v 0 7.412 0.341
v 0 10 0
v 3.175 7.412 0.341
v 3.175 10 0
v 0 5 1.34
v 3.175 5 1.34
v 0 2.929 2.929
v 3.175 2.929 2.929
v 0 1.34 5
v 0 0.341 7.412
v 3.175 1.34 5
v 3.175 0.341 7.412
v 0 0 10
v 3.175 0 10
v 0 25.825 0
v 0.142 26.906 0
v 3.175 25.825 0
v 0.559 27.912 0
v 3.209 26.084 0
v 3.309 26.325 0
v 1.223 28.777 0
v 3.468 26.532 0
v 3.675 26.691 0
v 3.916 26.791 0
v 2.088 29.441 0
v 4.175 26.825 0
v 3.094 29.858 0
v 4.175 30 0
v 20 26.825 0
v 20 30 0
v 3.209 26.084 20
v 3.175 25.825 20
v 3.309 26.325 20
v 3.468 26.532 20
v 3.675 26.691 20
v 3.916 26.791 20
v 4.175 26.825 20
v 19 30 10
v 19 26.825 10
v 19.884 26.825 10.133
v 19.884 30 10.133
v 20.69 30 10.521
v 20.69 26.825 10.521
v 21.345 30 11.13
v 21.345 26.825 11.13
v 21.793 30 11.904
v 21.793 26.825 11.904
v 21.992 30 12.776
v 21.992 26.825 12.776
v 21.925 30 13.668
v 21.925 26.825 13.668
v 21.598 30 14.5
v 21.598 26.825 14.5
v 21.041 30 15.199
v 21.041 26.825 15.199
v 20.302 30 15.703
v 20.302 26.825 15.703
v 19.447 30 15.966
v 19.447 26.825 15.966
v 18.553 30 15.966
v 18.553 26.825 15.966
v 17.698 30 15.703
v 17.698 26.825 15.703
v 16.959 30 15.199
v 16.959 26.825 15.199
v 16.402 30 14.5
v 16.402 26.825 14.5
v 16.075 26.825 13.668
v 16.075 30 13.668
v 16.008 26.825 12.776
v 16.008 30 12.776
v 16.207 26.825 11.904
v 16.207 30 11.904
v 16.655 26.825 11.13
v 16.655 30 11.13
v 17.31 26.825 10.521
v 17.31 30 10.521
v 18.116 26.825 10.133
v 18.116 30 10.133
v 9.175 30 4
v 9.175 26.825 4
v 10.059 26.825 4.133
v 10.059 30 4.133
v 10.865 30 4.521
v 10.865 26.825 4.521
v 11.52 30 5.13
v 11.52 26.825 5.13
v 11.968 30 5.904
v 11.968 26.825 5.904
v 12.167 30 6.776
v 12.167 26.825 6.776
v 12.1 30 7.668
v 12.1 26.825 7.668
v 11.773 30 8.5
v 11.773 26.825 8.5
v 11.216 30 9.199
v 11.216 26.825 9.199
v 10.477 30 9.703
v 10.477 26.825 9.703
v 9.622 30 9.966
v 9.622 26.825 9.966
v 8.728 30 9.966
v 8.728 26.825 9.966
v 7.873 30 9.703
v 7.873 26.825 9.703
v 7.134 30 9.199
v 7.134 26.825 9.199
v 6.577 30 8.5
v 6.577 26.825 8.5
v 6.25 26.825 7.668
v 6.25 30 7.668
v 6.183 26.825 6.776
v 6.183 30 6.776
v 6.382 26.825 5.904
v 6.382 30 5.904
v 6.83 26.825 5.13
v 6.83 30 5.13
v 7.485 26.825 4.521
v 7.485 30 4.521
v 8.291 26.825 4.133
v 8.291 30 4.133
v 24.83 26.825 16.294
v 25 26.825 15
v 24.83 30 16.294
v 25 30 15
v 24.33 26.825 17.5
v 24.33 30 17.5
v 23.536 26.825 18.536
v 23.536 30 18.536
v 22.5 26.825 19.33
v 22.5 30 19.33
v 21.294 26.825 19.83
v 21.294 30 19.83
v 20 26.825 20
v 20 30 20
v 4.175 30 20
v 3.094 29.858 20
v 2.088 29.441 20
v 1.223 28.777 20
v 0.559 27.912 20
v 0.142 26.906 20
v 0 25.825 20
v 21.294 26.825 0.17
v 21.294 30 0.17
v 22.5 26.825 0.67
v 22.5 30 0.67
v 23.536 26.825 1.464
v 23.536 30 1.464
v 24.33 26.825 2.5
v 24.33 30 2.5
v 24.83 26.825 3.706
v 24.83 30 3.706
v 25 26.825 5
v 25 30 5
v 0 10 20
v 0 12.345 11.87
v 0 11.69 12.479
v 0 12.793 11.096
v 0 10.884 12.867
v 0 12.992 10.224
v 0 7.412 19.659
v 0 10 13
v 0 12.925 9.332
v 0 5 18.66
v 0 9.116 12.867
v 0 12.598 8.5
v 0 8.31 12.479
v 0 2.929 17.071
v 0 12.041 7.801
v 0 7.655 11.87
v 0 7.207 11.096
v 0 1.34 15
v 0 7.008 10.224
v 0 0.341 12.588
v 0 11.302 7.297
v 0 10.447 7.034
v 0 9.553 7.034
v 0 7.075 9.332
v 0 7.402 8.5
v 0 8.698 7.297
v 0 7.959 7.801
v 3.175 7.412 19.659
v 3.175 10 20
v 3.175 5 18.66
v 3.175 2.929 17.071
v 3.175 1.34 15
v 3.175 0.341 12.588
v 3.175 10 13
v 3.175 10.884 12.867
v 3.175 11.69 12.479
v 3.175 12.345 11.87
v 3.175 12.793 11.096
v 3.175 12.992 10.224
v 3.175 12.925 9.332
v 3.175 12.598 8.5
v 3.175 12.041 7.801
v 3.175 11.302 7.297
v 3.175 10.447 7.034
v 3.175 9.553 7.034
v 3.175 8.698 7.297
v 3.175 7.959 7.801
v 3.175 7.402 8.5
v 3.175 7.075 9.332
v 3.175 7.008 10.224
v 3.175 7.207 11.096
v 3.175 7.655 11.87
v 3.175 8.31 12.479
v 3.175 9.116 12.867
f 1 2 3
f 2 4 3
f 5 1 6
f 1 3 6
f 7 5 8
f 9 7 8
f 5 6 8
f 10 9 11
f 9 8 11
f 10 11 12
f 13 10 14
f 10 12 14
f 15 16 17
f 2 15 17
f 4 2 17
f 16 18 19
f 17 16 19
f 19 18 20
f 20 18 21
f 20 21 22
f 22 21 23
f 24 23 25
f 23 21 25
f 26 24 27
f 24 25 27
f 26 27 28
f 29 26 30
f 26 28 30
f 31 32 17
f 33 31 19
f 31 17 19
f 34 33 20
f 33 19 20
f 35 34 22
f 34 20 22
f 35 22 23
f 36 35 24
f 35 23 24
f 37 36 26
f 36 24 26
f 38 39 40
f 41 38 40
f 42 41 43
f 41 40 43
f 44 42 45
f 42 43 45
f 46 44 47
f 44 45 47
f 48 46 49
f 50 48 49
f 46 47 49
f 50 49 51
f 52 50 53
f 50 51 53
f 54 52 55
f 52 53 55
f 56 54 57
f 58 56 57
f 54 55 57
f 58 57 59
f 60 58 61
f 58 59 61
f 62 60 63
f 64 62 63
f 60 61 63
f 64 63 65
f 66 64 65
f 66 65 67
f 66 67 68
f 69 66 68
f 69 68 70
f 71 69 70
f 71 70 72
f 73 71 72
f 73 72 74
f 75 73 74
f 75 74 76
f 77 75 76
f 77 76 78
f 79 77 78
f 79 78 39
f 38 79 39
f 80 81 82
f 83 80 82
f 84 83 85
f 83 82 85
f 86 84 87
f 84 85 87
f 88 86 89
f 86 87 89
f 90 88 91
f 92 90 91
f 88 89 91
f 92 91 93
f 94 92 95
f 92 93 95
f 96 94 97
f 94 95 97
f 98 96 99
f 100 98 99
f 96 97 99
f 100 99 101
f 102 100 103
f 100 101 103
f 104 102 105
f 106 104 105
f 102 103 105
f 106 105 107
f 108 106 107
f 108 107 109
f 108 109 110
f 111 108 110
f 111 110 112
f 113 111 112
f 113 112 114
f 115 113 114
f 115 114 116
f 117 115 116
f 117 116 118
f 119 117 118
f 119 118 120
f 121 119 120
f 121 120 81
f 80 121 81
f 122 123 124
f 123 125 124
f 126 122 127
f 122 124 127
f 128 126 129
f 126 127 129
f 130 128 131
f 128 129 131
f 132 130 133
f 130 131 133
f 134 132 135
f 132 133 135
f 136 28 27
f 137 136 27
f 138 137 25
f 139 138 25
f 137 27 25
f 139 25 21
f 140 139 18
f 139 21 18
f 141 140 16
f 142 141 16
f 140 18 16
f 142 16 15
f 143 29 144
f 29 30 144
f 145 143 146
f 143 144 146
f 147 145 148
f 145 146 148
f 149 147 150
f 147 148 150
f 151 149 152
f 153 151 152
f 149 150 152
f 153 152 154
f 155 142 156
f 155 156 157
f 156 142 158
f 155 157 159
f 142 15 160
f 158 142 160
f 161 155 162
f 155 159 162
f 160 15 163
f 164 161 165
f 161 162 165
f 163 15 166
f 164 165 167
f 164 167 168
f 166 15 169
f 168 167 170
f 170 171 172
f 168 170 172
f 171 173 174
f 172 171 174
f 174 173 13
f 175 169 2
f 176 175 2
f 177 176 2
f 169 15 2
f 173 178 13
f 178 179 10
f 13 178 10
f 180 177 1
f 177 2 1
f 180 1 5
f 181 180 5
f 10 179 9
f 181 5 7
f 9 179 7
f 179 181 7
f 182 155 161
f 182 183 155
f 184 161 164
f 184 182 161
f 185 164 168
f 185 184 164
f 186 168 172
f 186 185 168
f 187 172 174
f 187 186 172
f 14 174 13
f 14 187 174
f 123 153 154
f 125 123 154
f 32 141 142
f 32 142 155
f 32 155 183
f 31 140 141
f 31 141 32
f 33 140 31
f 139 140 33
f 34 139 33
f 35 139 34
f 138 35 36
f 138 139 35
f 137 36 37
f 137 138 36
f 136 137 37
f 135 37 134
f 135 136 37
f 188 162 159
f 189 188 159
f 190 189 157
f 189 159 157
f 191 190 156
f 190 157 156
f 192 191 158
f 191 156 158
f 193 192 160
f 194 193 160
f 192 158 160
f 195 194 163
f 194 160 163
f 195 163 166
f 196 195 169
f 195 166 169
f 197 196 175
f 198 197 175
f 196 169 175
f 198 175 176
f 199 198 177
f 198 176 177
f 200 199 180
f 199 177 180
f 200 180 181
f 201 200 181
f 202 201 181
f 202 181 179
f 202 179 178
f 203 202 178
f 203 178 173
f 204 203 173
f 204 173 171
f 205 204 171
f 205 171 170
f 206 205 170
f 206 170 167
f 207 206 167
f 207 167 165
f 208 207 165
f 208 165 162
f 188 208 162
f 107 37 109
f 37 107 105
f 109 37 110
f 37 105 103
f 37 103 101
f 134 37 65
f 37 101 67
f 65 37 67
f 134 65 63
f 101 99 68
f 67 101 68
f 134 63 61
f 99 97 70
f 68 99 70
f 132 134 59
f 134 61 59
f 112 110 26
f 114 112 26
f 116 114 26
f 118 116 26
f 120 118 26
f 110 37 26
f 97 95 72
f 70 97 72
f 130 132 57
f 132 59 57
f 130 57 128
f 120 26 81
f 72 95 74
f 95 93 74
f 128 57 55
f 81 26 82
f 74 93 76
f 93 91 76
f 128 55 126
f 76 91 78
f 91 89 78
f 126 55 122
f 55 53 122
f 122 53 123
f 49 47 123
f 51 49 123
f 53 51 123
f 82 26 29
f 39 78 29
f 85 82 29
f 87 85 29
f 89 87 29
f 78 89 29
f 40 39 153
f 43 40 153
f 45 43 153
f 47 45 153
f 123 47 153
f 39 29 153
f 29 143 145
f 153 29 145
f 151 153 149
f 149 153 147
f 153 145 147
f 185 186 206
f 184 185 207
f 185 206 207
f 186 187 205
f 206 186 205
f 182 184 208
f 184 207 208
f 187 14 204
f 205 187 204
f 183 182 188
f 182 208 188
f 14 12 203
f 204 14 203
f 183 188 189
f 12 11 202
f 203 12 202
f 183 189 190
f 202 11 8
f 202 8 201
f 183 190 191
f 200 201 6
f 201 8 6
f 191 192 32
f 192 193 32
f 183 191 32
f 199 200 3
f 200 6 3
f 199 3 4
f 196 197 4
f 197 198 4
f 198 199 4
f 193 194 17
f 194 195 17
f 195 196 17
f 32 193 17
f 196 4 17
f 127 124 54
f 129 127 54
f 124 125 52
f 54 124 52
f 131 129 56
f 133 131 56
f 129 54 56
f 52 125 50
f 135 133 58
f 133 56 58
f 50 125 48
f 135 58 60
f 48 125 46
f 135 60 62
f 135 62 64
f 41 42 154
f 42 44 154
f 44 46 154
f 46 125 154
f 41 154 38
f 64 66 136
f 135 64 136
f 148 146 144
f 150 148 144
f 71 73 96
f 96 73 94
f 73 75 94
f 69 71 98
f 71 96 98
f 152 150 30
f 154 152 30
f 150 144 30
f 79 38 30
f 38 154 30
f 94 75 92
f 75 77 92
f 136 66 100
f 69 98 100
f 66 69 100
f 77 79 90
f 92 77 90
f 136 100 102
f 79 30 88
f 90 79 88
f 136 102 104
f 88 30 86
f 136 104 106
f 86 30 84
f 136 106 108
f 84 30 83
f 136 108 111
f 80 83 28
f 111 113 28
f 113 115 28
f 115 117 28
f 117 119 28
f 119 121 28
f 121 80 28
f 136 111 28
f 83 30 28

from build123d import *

# Parameters (mm, degrees)
BASE_FLANGE1_DEPTH = 20
SKETCH6_R          = 3
CUT_EXTRUDE1_DEPTH = 44.874821937
FILLET1_R          = 10
FILLET2_R          = 5
SKETCH7_R          = 3
CUT_EXTRUDE2_DEPTH = 42.768177181


# Read off the part's stored shape, not the designer's step: Base-Flange1
with BuildPart() as part:
    # Base-Flange1 outline → Base-Flange1 (new body)
    with BuildSketch(Plane.XY):
        with BuildLine():
            Line((4.175, 26.825), (25, 26.825))
            Line((25, 26.825), (25, 30))
            Line((25, 30), (4.175, 30))
            ThreePointArc((4.175, 30), (1.222829189, 28.777170811), (0, 25.825))
            Line((0, 25.825), (0, 0))
            Line((0, 0), (3.175, 0))
            Line((3.175, 0), (3.175, 25.825))
            ThreePointArc((3.175, 25.825), (3.467893219, 26.532106781), (4.175, 26.825))
        make_face()
    extrude(amount=BASE_FLANGE1_DEPTH)

    # Sketch6 → Cut-Extrude1 (cut, through all)
    with BuildSketch(Plane.ZY):
        with Locations((10, 10)):
            Circle(SKETCH6_R)
    extrude(amount=-CUT_EXTRUDE1_DEPTH, mode=Mode.SUBTRACT)

    # Fillet1
    fillet1_edges = [part.edges().sort_by_distance(p)[0] for p in [
        (1.5875, 0, 0),
        (1.5875, 0, 20),
    ]]
    fillet(fillet1_edges, radius=FILLET1_R - 0.0001)  # a hair under: the kernel refuses the full size

    # Fillet2
    fillet2_edges = [part.edges().sort_by_distance(p)[0] for p in [
        (25, 28.4125, 20),
        (25, 28.4125, 0),
    ]]
    fillet(fillet2_edges, radius=FILLET2_R)

    # Sketch7 → Cut-Extrude2 (cut, through all)
    with BuildSketch(Plane.XZ.offset(-26.825)):
        with Locations(Location((9.175, 7, 0), (0, 0, 270))):
            Circle(SKETCH7_R)
        with Locations(Location((19, 13, 0), (0, 0, 270))):
            Circle(SKETCH7_R)
    extrude(amount=-CUT_EXTRUDE2_DEPTH, mode=Mode.SUBTRACT)


solid = part.part
